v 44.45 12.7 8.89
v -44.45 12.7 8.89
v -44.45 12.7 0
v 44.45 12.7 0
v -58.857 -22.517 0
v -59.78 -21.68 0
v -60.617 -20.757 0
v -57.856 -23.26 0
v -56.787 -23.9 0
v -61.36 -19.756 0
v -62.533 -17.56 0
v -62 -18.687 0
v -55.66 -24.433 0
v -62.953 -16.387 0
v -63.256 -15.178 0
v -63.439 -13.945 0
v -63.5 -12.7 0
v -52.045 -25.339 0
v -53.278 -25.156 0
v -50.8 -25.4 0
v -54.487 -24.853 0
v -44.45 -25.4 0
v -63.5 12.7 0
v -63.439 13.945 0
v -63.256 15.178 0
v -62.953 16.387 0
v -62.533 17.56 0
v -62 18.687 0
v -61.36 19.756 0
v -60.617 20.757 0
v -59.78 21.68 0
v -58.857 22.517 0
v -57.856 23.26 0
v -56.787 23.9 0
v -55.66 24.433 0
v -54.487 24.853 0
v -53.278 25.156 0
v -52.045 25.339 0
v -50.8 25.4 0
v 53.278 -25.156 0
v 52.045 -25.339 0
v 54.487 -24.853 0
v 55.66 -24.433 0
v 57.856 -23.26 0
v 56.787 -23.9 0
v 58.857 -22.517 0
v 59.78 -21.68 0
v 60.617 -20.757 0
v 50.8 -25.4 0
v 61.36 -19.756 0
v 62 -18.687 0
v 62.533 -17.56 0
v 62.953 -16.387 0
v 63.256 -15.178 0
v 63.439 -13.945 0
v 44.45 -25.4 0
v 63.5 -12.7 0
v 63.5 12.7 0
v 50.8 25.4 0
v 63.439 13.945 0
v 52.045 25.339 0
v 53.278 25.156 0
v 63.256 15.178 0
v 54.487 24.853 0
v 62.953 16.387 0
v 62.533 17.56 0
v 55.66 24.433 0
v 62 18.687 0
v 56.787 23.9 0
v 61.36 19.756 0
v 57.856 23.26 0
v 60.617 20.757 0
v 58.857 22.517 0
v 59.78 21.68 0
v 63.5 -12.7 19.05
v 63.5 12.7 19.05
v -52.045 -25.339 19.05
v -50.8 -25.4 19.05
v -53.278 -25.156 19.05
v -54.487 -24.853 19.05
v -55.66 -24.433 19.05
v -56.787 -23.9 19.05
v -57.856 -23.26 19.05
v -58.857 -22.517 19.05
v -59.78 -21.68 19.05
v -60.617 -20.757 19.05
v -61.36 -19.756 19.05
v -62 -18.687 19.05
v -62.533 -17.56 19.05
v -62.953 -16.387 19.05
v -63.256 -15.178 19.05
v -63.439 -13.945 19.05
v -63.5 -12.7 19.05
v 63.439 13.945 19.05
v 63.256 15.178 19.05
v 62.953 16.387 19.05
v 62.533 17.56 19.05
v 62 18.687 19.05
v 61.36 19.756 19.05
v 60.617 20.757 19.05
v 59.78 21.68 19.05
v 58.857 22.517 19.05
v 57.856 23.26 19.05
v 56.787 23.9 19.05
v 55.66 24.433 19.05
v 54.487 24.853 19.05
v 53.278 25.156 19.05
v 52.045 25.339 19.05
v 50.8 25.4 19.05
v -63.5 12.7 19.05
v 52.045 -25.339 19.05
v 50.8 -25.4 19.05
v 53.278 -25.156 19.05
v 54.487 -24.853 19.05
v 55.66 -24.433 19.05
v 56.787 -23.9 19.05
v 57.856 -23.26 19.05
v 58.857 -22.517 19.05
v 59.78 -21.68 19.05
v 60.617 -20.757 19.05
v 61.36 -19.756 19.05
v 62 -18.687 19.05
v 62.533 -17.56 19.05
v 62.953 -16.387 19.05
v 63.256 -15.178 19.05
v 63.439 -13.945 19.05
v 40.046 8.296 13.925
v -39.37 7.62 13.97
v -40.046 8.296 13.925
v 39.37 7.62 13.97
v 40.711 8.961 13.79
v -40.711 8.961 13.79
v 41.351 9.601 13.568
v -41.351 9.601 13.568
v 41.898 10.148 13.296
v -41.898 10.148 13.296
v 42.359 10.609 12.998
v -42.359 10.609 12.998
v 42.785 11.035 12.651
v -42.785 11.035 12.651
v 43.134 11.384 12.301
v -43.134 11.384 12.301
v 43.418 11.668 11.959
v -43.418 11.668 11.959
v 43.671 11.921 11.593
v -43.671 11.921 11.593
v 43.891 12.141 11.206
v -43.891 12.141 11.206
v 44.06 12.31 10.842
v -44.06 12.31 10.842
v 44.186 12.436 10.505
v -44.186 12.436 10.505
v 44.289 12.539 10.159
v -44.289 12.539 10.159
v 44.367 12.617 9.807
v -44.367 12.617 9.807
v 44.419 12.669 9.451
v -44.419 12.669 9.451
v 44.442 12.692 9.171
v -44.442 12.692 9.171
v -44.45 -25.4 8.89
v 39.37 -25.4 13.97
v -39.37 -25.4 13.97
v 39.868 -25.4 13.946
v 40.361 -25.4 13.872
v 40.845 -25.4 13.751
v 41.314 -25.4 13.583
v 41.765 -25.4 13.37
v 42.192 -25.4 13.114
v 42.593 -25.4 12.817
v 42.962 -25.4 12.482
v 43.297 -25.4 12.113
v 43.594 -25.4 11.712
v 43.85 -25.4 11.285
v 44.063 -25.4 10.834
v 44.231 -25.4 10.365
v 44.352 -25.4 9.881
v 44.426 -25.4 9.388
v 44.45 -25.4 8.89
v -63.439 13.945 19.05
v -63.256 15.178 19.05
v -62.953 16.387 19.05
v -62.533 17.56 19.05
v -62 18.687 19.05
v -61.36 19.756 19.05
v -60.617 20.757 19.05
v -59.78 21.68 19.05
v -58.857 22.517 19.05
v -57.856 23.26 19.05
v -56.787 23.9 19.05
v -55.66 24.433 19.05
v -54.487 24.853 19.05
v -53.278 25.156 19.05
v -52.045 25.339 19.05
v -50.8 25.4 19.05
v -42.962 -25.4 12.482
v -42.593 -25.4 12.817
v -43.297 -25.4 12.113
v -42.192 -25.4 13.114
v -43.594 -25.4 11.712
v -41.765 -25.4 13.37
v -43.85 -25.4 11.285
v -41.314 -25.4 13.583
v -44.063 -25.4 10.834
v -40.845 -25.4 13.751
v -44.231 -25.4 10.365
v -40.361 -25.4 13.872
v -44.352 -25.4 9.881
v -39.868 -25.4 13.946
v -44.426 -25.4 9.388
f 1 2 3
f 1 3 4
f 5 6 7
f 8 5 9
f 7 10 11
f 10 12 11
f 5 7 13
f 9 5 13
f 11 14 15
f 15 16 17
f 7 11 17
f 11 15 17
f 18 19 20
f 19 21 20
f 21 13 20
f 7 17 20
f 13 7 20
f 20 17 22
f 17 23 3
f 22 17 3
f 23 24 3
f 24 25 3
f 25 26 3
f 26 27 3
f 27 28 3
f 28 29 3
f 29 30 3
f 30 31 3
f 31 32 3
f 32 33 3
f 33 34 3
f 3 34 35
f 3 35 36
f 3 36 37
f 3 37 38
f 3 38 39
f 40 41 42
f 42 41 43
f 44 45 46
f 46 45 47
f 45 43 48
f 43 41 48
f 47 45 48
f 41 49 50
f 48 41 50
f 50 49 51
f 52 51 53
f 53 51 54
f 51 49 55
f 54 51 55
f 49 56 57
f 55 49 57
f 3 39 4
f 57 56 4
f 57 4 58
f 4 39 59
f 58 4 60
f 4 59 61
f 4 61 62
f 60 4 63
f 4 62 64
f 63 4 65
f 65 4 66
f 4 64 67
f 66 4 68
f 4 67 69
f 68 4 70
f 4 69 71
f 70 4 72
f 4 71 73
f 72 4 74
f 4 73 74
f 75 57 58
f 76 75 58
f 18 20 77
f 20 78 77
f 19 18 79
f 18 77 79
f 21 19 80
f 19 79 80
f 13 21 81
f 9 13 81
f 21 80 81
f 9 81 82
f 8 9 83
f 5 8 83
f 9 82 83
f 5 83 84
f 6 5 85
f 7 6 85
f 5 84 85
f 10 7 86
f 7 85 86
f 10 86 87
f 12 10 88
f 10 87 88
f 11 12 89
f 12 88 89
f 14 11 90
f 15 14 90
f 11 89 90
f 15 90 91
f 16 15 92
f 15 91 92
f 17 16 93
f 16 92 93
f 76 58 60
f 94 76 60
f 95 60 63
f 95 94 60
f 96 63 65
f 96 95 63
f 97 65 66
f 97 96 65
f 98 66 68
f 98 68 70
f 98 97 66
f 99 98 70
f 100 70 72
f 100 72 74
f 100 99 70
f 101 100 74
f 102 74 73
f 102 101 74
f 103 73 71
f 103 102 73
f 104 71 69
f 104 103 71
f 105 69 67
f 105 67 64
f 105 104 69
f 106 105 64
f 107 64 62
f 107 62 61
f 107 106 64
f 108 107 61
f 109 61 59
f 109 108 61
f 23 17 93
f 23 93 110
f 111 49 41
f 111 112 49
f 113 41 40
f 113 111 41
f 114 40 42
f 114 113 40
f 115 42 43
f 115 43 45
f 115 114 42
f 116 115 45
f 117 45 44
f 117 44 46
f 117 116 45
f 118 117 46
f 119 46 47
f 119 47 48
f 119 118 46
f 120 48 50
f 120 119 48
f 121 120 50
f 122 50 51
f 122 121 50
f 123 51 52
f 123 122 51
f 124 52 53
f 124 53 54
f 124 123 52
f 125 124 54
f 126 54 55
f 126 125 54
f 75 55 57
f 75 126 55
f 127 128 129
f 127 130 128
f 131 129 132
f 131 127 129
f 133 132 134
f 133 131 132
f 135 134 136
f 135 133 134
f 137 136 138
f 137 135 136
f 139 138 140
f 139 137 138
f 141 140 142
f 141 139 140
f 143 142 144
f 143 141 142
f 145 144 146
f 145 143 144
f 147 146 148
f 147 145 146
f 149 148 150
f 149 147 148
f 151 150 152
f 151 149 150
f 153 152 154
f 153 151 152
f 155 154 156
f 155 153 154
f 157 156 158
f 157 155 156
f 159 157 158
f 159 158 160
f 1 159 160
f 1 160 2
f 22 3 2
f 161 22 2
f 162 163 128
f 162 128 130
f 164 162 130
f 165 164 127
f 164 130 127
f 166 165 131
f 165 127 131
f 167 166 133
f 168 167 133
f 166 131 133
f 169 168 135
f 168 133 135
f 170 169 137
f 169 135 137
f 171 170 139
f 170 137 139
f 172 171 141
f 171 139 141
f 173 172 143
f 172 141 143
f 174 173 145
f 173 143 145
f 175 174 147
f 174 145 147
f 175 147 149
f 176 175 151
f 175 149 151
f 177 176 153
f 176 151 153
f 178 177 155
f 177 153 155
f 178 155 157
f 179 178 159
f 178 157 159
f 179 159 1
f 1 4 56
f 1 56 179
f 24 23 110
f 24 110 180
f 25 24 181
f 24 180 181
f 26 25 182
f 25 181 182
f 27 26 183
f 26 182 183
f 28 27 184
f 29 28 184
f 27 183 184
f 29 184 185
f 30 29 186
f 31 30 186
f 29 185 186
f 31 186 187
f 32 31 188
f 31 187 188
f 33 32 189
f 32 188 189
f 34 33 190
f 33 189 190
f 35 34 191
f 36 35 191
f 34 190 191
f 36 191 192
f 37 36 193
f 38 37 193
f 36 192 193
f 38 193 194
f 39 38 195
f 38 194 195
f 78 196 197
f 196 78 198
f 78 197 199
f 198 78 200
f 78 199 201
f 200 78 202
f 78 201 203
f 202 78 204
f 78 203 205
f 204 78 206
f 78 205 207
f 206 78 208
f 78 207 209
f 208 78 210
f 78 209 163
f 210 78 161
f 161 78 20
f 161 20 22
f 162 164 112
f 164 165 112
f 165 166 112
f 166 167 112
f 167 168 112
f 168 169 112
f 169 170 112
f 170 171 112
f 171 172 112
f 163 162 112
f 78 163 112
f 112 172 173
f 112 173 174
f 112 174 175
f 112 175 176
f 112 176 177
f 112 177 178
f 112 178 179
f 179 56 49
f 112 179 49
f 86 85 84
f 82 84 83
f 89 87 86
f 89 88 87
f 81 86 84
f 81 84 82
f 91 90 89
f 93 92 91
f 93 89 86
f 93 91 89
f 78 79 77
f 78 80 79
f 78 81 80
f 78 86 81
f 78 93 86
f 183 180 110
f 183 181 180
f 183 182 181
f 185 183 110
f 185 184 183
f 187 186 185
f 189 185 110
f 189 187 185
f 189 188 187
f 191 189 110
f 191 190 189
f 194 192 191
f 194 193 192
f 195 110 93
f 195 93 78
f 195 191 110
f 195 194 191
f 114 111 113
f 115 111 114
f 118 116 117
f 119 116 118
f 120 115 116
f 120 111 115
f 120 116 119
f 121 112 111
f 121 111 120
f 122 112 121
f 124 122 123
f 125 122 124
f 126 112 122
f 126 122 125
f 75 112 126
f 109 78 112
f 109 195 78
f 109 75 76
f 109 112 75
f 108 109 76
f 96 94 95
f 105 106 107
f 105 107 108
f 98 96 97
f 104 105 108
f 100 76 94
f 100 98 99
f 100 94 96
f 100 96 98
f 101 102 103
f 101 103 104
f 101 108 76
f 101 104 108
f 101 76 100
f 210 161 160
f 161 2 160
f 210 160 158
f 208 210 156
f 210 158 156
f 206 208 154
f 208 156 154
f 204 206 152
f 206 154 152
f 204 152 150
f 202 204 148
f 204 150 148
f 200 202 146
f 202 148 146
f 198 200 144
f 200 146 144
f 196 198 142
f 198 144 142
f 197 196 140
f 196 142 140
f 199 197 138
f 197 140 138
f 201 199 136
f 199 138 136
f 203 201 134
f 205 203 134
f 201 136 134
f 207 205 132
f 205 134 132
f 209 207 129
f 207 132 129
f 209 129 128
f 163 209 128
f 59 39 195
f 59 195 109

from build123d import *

# Parameters (mm, degrees)
F0_W     = 127
F0_H     = 50.8
F1_DEPTH = 19.05
F2_W     = 88.9
F2_H     = 13.97
F3_DEPTH = 38.1
F4_R     = 5.08
F5_R     = 12.7


with BuildPart() as f1:
    # F0 (on Top) → F1 (new body)
    with BuildSketch(Plane.XY):
        Rectangle(F0_W, F0_H)
    extrude(amount=F1_DEPTH)

    # F2 (on face) → F3 (cut)
    with BuildSketch(Plane.XZ.offset(25.4)):
        with Locations((0, 6.985)):
            Rectangle(F2_W, F2_H)
    extrude(amount=-F3_DEPTH, mode=Mode.SUBTRACT)

    # F4
    f4_edges = [f1.edges().sort_by_distance(p)[0] for p in [
        (44.45, -6.35, 13.97),
        (0, 12.7, 13.97),
        (-44.45, -6.35, 13.97),
    ]]
    fillet(f4_edges, radius=F4_R)

    # F5
    f5_edges = [f1.edges().sort_by_distance(p)[0] for p in [
        (-63.5, 25.4, 9.525),
        (63.5, 25.4, 9.525),
        (-63.5, -25.4, 9.525),
        (63.5, -25.4, 9.525),
    ]]
    fillet(f5_edges, radius=F5_R)


solid = f1.part
